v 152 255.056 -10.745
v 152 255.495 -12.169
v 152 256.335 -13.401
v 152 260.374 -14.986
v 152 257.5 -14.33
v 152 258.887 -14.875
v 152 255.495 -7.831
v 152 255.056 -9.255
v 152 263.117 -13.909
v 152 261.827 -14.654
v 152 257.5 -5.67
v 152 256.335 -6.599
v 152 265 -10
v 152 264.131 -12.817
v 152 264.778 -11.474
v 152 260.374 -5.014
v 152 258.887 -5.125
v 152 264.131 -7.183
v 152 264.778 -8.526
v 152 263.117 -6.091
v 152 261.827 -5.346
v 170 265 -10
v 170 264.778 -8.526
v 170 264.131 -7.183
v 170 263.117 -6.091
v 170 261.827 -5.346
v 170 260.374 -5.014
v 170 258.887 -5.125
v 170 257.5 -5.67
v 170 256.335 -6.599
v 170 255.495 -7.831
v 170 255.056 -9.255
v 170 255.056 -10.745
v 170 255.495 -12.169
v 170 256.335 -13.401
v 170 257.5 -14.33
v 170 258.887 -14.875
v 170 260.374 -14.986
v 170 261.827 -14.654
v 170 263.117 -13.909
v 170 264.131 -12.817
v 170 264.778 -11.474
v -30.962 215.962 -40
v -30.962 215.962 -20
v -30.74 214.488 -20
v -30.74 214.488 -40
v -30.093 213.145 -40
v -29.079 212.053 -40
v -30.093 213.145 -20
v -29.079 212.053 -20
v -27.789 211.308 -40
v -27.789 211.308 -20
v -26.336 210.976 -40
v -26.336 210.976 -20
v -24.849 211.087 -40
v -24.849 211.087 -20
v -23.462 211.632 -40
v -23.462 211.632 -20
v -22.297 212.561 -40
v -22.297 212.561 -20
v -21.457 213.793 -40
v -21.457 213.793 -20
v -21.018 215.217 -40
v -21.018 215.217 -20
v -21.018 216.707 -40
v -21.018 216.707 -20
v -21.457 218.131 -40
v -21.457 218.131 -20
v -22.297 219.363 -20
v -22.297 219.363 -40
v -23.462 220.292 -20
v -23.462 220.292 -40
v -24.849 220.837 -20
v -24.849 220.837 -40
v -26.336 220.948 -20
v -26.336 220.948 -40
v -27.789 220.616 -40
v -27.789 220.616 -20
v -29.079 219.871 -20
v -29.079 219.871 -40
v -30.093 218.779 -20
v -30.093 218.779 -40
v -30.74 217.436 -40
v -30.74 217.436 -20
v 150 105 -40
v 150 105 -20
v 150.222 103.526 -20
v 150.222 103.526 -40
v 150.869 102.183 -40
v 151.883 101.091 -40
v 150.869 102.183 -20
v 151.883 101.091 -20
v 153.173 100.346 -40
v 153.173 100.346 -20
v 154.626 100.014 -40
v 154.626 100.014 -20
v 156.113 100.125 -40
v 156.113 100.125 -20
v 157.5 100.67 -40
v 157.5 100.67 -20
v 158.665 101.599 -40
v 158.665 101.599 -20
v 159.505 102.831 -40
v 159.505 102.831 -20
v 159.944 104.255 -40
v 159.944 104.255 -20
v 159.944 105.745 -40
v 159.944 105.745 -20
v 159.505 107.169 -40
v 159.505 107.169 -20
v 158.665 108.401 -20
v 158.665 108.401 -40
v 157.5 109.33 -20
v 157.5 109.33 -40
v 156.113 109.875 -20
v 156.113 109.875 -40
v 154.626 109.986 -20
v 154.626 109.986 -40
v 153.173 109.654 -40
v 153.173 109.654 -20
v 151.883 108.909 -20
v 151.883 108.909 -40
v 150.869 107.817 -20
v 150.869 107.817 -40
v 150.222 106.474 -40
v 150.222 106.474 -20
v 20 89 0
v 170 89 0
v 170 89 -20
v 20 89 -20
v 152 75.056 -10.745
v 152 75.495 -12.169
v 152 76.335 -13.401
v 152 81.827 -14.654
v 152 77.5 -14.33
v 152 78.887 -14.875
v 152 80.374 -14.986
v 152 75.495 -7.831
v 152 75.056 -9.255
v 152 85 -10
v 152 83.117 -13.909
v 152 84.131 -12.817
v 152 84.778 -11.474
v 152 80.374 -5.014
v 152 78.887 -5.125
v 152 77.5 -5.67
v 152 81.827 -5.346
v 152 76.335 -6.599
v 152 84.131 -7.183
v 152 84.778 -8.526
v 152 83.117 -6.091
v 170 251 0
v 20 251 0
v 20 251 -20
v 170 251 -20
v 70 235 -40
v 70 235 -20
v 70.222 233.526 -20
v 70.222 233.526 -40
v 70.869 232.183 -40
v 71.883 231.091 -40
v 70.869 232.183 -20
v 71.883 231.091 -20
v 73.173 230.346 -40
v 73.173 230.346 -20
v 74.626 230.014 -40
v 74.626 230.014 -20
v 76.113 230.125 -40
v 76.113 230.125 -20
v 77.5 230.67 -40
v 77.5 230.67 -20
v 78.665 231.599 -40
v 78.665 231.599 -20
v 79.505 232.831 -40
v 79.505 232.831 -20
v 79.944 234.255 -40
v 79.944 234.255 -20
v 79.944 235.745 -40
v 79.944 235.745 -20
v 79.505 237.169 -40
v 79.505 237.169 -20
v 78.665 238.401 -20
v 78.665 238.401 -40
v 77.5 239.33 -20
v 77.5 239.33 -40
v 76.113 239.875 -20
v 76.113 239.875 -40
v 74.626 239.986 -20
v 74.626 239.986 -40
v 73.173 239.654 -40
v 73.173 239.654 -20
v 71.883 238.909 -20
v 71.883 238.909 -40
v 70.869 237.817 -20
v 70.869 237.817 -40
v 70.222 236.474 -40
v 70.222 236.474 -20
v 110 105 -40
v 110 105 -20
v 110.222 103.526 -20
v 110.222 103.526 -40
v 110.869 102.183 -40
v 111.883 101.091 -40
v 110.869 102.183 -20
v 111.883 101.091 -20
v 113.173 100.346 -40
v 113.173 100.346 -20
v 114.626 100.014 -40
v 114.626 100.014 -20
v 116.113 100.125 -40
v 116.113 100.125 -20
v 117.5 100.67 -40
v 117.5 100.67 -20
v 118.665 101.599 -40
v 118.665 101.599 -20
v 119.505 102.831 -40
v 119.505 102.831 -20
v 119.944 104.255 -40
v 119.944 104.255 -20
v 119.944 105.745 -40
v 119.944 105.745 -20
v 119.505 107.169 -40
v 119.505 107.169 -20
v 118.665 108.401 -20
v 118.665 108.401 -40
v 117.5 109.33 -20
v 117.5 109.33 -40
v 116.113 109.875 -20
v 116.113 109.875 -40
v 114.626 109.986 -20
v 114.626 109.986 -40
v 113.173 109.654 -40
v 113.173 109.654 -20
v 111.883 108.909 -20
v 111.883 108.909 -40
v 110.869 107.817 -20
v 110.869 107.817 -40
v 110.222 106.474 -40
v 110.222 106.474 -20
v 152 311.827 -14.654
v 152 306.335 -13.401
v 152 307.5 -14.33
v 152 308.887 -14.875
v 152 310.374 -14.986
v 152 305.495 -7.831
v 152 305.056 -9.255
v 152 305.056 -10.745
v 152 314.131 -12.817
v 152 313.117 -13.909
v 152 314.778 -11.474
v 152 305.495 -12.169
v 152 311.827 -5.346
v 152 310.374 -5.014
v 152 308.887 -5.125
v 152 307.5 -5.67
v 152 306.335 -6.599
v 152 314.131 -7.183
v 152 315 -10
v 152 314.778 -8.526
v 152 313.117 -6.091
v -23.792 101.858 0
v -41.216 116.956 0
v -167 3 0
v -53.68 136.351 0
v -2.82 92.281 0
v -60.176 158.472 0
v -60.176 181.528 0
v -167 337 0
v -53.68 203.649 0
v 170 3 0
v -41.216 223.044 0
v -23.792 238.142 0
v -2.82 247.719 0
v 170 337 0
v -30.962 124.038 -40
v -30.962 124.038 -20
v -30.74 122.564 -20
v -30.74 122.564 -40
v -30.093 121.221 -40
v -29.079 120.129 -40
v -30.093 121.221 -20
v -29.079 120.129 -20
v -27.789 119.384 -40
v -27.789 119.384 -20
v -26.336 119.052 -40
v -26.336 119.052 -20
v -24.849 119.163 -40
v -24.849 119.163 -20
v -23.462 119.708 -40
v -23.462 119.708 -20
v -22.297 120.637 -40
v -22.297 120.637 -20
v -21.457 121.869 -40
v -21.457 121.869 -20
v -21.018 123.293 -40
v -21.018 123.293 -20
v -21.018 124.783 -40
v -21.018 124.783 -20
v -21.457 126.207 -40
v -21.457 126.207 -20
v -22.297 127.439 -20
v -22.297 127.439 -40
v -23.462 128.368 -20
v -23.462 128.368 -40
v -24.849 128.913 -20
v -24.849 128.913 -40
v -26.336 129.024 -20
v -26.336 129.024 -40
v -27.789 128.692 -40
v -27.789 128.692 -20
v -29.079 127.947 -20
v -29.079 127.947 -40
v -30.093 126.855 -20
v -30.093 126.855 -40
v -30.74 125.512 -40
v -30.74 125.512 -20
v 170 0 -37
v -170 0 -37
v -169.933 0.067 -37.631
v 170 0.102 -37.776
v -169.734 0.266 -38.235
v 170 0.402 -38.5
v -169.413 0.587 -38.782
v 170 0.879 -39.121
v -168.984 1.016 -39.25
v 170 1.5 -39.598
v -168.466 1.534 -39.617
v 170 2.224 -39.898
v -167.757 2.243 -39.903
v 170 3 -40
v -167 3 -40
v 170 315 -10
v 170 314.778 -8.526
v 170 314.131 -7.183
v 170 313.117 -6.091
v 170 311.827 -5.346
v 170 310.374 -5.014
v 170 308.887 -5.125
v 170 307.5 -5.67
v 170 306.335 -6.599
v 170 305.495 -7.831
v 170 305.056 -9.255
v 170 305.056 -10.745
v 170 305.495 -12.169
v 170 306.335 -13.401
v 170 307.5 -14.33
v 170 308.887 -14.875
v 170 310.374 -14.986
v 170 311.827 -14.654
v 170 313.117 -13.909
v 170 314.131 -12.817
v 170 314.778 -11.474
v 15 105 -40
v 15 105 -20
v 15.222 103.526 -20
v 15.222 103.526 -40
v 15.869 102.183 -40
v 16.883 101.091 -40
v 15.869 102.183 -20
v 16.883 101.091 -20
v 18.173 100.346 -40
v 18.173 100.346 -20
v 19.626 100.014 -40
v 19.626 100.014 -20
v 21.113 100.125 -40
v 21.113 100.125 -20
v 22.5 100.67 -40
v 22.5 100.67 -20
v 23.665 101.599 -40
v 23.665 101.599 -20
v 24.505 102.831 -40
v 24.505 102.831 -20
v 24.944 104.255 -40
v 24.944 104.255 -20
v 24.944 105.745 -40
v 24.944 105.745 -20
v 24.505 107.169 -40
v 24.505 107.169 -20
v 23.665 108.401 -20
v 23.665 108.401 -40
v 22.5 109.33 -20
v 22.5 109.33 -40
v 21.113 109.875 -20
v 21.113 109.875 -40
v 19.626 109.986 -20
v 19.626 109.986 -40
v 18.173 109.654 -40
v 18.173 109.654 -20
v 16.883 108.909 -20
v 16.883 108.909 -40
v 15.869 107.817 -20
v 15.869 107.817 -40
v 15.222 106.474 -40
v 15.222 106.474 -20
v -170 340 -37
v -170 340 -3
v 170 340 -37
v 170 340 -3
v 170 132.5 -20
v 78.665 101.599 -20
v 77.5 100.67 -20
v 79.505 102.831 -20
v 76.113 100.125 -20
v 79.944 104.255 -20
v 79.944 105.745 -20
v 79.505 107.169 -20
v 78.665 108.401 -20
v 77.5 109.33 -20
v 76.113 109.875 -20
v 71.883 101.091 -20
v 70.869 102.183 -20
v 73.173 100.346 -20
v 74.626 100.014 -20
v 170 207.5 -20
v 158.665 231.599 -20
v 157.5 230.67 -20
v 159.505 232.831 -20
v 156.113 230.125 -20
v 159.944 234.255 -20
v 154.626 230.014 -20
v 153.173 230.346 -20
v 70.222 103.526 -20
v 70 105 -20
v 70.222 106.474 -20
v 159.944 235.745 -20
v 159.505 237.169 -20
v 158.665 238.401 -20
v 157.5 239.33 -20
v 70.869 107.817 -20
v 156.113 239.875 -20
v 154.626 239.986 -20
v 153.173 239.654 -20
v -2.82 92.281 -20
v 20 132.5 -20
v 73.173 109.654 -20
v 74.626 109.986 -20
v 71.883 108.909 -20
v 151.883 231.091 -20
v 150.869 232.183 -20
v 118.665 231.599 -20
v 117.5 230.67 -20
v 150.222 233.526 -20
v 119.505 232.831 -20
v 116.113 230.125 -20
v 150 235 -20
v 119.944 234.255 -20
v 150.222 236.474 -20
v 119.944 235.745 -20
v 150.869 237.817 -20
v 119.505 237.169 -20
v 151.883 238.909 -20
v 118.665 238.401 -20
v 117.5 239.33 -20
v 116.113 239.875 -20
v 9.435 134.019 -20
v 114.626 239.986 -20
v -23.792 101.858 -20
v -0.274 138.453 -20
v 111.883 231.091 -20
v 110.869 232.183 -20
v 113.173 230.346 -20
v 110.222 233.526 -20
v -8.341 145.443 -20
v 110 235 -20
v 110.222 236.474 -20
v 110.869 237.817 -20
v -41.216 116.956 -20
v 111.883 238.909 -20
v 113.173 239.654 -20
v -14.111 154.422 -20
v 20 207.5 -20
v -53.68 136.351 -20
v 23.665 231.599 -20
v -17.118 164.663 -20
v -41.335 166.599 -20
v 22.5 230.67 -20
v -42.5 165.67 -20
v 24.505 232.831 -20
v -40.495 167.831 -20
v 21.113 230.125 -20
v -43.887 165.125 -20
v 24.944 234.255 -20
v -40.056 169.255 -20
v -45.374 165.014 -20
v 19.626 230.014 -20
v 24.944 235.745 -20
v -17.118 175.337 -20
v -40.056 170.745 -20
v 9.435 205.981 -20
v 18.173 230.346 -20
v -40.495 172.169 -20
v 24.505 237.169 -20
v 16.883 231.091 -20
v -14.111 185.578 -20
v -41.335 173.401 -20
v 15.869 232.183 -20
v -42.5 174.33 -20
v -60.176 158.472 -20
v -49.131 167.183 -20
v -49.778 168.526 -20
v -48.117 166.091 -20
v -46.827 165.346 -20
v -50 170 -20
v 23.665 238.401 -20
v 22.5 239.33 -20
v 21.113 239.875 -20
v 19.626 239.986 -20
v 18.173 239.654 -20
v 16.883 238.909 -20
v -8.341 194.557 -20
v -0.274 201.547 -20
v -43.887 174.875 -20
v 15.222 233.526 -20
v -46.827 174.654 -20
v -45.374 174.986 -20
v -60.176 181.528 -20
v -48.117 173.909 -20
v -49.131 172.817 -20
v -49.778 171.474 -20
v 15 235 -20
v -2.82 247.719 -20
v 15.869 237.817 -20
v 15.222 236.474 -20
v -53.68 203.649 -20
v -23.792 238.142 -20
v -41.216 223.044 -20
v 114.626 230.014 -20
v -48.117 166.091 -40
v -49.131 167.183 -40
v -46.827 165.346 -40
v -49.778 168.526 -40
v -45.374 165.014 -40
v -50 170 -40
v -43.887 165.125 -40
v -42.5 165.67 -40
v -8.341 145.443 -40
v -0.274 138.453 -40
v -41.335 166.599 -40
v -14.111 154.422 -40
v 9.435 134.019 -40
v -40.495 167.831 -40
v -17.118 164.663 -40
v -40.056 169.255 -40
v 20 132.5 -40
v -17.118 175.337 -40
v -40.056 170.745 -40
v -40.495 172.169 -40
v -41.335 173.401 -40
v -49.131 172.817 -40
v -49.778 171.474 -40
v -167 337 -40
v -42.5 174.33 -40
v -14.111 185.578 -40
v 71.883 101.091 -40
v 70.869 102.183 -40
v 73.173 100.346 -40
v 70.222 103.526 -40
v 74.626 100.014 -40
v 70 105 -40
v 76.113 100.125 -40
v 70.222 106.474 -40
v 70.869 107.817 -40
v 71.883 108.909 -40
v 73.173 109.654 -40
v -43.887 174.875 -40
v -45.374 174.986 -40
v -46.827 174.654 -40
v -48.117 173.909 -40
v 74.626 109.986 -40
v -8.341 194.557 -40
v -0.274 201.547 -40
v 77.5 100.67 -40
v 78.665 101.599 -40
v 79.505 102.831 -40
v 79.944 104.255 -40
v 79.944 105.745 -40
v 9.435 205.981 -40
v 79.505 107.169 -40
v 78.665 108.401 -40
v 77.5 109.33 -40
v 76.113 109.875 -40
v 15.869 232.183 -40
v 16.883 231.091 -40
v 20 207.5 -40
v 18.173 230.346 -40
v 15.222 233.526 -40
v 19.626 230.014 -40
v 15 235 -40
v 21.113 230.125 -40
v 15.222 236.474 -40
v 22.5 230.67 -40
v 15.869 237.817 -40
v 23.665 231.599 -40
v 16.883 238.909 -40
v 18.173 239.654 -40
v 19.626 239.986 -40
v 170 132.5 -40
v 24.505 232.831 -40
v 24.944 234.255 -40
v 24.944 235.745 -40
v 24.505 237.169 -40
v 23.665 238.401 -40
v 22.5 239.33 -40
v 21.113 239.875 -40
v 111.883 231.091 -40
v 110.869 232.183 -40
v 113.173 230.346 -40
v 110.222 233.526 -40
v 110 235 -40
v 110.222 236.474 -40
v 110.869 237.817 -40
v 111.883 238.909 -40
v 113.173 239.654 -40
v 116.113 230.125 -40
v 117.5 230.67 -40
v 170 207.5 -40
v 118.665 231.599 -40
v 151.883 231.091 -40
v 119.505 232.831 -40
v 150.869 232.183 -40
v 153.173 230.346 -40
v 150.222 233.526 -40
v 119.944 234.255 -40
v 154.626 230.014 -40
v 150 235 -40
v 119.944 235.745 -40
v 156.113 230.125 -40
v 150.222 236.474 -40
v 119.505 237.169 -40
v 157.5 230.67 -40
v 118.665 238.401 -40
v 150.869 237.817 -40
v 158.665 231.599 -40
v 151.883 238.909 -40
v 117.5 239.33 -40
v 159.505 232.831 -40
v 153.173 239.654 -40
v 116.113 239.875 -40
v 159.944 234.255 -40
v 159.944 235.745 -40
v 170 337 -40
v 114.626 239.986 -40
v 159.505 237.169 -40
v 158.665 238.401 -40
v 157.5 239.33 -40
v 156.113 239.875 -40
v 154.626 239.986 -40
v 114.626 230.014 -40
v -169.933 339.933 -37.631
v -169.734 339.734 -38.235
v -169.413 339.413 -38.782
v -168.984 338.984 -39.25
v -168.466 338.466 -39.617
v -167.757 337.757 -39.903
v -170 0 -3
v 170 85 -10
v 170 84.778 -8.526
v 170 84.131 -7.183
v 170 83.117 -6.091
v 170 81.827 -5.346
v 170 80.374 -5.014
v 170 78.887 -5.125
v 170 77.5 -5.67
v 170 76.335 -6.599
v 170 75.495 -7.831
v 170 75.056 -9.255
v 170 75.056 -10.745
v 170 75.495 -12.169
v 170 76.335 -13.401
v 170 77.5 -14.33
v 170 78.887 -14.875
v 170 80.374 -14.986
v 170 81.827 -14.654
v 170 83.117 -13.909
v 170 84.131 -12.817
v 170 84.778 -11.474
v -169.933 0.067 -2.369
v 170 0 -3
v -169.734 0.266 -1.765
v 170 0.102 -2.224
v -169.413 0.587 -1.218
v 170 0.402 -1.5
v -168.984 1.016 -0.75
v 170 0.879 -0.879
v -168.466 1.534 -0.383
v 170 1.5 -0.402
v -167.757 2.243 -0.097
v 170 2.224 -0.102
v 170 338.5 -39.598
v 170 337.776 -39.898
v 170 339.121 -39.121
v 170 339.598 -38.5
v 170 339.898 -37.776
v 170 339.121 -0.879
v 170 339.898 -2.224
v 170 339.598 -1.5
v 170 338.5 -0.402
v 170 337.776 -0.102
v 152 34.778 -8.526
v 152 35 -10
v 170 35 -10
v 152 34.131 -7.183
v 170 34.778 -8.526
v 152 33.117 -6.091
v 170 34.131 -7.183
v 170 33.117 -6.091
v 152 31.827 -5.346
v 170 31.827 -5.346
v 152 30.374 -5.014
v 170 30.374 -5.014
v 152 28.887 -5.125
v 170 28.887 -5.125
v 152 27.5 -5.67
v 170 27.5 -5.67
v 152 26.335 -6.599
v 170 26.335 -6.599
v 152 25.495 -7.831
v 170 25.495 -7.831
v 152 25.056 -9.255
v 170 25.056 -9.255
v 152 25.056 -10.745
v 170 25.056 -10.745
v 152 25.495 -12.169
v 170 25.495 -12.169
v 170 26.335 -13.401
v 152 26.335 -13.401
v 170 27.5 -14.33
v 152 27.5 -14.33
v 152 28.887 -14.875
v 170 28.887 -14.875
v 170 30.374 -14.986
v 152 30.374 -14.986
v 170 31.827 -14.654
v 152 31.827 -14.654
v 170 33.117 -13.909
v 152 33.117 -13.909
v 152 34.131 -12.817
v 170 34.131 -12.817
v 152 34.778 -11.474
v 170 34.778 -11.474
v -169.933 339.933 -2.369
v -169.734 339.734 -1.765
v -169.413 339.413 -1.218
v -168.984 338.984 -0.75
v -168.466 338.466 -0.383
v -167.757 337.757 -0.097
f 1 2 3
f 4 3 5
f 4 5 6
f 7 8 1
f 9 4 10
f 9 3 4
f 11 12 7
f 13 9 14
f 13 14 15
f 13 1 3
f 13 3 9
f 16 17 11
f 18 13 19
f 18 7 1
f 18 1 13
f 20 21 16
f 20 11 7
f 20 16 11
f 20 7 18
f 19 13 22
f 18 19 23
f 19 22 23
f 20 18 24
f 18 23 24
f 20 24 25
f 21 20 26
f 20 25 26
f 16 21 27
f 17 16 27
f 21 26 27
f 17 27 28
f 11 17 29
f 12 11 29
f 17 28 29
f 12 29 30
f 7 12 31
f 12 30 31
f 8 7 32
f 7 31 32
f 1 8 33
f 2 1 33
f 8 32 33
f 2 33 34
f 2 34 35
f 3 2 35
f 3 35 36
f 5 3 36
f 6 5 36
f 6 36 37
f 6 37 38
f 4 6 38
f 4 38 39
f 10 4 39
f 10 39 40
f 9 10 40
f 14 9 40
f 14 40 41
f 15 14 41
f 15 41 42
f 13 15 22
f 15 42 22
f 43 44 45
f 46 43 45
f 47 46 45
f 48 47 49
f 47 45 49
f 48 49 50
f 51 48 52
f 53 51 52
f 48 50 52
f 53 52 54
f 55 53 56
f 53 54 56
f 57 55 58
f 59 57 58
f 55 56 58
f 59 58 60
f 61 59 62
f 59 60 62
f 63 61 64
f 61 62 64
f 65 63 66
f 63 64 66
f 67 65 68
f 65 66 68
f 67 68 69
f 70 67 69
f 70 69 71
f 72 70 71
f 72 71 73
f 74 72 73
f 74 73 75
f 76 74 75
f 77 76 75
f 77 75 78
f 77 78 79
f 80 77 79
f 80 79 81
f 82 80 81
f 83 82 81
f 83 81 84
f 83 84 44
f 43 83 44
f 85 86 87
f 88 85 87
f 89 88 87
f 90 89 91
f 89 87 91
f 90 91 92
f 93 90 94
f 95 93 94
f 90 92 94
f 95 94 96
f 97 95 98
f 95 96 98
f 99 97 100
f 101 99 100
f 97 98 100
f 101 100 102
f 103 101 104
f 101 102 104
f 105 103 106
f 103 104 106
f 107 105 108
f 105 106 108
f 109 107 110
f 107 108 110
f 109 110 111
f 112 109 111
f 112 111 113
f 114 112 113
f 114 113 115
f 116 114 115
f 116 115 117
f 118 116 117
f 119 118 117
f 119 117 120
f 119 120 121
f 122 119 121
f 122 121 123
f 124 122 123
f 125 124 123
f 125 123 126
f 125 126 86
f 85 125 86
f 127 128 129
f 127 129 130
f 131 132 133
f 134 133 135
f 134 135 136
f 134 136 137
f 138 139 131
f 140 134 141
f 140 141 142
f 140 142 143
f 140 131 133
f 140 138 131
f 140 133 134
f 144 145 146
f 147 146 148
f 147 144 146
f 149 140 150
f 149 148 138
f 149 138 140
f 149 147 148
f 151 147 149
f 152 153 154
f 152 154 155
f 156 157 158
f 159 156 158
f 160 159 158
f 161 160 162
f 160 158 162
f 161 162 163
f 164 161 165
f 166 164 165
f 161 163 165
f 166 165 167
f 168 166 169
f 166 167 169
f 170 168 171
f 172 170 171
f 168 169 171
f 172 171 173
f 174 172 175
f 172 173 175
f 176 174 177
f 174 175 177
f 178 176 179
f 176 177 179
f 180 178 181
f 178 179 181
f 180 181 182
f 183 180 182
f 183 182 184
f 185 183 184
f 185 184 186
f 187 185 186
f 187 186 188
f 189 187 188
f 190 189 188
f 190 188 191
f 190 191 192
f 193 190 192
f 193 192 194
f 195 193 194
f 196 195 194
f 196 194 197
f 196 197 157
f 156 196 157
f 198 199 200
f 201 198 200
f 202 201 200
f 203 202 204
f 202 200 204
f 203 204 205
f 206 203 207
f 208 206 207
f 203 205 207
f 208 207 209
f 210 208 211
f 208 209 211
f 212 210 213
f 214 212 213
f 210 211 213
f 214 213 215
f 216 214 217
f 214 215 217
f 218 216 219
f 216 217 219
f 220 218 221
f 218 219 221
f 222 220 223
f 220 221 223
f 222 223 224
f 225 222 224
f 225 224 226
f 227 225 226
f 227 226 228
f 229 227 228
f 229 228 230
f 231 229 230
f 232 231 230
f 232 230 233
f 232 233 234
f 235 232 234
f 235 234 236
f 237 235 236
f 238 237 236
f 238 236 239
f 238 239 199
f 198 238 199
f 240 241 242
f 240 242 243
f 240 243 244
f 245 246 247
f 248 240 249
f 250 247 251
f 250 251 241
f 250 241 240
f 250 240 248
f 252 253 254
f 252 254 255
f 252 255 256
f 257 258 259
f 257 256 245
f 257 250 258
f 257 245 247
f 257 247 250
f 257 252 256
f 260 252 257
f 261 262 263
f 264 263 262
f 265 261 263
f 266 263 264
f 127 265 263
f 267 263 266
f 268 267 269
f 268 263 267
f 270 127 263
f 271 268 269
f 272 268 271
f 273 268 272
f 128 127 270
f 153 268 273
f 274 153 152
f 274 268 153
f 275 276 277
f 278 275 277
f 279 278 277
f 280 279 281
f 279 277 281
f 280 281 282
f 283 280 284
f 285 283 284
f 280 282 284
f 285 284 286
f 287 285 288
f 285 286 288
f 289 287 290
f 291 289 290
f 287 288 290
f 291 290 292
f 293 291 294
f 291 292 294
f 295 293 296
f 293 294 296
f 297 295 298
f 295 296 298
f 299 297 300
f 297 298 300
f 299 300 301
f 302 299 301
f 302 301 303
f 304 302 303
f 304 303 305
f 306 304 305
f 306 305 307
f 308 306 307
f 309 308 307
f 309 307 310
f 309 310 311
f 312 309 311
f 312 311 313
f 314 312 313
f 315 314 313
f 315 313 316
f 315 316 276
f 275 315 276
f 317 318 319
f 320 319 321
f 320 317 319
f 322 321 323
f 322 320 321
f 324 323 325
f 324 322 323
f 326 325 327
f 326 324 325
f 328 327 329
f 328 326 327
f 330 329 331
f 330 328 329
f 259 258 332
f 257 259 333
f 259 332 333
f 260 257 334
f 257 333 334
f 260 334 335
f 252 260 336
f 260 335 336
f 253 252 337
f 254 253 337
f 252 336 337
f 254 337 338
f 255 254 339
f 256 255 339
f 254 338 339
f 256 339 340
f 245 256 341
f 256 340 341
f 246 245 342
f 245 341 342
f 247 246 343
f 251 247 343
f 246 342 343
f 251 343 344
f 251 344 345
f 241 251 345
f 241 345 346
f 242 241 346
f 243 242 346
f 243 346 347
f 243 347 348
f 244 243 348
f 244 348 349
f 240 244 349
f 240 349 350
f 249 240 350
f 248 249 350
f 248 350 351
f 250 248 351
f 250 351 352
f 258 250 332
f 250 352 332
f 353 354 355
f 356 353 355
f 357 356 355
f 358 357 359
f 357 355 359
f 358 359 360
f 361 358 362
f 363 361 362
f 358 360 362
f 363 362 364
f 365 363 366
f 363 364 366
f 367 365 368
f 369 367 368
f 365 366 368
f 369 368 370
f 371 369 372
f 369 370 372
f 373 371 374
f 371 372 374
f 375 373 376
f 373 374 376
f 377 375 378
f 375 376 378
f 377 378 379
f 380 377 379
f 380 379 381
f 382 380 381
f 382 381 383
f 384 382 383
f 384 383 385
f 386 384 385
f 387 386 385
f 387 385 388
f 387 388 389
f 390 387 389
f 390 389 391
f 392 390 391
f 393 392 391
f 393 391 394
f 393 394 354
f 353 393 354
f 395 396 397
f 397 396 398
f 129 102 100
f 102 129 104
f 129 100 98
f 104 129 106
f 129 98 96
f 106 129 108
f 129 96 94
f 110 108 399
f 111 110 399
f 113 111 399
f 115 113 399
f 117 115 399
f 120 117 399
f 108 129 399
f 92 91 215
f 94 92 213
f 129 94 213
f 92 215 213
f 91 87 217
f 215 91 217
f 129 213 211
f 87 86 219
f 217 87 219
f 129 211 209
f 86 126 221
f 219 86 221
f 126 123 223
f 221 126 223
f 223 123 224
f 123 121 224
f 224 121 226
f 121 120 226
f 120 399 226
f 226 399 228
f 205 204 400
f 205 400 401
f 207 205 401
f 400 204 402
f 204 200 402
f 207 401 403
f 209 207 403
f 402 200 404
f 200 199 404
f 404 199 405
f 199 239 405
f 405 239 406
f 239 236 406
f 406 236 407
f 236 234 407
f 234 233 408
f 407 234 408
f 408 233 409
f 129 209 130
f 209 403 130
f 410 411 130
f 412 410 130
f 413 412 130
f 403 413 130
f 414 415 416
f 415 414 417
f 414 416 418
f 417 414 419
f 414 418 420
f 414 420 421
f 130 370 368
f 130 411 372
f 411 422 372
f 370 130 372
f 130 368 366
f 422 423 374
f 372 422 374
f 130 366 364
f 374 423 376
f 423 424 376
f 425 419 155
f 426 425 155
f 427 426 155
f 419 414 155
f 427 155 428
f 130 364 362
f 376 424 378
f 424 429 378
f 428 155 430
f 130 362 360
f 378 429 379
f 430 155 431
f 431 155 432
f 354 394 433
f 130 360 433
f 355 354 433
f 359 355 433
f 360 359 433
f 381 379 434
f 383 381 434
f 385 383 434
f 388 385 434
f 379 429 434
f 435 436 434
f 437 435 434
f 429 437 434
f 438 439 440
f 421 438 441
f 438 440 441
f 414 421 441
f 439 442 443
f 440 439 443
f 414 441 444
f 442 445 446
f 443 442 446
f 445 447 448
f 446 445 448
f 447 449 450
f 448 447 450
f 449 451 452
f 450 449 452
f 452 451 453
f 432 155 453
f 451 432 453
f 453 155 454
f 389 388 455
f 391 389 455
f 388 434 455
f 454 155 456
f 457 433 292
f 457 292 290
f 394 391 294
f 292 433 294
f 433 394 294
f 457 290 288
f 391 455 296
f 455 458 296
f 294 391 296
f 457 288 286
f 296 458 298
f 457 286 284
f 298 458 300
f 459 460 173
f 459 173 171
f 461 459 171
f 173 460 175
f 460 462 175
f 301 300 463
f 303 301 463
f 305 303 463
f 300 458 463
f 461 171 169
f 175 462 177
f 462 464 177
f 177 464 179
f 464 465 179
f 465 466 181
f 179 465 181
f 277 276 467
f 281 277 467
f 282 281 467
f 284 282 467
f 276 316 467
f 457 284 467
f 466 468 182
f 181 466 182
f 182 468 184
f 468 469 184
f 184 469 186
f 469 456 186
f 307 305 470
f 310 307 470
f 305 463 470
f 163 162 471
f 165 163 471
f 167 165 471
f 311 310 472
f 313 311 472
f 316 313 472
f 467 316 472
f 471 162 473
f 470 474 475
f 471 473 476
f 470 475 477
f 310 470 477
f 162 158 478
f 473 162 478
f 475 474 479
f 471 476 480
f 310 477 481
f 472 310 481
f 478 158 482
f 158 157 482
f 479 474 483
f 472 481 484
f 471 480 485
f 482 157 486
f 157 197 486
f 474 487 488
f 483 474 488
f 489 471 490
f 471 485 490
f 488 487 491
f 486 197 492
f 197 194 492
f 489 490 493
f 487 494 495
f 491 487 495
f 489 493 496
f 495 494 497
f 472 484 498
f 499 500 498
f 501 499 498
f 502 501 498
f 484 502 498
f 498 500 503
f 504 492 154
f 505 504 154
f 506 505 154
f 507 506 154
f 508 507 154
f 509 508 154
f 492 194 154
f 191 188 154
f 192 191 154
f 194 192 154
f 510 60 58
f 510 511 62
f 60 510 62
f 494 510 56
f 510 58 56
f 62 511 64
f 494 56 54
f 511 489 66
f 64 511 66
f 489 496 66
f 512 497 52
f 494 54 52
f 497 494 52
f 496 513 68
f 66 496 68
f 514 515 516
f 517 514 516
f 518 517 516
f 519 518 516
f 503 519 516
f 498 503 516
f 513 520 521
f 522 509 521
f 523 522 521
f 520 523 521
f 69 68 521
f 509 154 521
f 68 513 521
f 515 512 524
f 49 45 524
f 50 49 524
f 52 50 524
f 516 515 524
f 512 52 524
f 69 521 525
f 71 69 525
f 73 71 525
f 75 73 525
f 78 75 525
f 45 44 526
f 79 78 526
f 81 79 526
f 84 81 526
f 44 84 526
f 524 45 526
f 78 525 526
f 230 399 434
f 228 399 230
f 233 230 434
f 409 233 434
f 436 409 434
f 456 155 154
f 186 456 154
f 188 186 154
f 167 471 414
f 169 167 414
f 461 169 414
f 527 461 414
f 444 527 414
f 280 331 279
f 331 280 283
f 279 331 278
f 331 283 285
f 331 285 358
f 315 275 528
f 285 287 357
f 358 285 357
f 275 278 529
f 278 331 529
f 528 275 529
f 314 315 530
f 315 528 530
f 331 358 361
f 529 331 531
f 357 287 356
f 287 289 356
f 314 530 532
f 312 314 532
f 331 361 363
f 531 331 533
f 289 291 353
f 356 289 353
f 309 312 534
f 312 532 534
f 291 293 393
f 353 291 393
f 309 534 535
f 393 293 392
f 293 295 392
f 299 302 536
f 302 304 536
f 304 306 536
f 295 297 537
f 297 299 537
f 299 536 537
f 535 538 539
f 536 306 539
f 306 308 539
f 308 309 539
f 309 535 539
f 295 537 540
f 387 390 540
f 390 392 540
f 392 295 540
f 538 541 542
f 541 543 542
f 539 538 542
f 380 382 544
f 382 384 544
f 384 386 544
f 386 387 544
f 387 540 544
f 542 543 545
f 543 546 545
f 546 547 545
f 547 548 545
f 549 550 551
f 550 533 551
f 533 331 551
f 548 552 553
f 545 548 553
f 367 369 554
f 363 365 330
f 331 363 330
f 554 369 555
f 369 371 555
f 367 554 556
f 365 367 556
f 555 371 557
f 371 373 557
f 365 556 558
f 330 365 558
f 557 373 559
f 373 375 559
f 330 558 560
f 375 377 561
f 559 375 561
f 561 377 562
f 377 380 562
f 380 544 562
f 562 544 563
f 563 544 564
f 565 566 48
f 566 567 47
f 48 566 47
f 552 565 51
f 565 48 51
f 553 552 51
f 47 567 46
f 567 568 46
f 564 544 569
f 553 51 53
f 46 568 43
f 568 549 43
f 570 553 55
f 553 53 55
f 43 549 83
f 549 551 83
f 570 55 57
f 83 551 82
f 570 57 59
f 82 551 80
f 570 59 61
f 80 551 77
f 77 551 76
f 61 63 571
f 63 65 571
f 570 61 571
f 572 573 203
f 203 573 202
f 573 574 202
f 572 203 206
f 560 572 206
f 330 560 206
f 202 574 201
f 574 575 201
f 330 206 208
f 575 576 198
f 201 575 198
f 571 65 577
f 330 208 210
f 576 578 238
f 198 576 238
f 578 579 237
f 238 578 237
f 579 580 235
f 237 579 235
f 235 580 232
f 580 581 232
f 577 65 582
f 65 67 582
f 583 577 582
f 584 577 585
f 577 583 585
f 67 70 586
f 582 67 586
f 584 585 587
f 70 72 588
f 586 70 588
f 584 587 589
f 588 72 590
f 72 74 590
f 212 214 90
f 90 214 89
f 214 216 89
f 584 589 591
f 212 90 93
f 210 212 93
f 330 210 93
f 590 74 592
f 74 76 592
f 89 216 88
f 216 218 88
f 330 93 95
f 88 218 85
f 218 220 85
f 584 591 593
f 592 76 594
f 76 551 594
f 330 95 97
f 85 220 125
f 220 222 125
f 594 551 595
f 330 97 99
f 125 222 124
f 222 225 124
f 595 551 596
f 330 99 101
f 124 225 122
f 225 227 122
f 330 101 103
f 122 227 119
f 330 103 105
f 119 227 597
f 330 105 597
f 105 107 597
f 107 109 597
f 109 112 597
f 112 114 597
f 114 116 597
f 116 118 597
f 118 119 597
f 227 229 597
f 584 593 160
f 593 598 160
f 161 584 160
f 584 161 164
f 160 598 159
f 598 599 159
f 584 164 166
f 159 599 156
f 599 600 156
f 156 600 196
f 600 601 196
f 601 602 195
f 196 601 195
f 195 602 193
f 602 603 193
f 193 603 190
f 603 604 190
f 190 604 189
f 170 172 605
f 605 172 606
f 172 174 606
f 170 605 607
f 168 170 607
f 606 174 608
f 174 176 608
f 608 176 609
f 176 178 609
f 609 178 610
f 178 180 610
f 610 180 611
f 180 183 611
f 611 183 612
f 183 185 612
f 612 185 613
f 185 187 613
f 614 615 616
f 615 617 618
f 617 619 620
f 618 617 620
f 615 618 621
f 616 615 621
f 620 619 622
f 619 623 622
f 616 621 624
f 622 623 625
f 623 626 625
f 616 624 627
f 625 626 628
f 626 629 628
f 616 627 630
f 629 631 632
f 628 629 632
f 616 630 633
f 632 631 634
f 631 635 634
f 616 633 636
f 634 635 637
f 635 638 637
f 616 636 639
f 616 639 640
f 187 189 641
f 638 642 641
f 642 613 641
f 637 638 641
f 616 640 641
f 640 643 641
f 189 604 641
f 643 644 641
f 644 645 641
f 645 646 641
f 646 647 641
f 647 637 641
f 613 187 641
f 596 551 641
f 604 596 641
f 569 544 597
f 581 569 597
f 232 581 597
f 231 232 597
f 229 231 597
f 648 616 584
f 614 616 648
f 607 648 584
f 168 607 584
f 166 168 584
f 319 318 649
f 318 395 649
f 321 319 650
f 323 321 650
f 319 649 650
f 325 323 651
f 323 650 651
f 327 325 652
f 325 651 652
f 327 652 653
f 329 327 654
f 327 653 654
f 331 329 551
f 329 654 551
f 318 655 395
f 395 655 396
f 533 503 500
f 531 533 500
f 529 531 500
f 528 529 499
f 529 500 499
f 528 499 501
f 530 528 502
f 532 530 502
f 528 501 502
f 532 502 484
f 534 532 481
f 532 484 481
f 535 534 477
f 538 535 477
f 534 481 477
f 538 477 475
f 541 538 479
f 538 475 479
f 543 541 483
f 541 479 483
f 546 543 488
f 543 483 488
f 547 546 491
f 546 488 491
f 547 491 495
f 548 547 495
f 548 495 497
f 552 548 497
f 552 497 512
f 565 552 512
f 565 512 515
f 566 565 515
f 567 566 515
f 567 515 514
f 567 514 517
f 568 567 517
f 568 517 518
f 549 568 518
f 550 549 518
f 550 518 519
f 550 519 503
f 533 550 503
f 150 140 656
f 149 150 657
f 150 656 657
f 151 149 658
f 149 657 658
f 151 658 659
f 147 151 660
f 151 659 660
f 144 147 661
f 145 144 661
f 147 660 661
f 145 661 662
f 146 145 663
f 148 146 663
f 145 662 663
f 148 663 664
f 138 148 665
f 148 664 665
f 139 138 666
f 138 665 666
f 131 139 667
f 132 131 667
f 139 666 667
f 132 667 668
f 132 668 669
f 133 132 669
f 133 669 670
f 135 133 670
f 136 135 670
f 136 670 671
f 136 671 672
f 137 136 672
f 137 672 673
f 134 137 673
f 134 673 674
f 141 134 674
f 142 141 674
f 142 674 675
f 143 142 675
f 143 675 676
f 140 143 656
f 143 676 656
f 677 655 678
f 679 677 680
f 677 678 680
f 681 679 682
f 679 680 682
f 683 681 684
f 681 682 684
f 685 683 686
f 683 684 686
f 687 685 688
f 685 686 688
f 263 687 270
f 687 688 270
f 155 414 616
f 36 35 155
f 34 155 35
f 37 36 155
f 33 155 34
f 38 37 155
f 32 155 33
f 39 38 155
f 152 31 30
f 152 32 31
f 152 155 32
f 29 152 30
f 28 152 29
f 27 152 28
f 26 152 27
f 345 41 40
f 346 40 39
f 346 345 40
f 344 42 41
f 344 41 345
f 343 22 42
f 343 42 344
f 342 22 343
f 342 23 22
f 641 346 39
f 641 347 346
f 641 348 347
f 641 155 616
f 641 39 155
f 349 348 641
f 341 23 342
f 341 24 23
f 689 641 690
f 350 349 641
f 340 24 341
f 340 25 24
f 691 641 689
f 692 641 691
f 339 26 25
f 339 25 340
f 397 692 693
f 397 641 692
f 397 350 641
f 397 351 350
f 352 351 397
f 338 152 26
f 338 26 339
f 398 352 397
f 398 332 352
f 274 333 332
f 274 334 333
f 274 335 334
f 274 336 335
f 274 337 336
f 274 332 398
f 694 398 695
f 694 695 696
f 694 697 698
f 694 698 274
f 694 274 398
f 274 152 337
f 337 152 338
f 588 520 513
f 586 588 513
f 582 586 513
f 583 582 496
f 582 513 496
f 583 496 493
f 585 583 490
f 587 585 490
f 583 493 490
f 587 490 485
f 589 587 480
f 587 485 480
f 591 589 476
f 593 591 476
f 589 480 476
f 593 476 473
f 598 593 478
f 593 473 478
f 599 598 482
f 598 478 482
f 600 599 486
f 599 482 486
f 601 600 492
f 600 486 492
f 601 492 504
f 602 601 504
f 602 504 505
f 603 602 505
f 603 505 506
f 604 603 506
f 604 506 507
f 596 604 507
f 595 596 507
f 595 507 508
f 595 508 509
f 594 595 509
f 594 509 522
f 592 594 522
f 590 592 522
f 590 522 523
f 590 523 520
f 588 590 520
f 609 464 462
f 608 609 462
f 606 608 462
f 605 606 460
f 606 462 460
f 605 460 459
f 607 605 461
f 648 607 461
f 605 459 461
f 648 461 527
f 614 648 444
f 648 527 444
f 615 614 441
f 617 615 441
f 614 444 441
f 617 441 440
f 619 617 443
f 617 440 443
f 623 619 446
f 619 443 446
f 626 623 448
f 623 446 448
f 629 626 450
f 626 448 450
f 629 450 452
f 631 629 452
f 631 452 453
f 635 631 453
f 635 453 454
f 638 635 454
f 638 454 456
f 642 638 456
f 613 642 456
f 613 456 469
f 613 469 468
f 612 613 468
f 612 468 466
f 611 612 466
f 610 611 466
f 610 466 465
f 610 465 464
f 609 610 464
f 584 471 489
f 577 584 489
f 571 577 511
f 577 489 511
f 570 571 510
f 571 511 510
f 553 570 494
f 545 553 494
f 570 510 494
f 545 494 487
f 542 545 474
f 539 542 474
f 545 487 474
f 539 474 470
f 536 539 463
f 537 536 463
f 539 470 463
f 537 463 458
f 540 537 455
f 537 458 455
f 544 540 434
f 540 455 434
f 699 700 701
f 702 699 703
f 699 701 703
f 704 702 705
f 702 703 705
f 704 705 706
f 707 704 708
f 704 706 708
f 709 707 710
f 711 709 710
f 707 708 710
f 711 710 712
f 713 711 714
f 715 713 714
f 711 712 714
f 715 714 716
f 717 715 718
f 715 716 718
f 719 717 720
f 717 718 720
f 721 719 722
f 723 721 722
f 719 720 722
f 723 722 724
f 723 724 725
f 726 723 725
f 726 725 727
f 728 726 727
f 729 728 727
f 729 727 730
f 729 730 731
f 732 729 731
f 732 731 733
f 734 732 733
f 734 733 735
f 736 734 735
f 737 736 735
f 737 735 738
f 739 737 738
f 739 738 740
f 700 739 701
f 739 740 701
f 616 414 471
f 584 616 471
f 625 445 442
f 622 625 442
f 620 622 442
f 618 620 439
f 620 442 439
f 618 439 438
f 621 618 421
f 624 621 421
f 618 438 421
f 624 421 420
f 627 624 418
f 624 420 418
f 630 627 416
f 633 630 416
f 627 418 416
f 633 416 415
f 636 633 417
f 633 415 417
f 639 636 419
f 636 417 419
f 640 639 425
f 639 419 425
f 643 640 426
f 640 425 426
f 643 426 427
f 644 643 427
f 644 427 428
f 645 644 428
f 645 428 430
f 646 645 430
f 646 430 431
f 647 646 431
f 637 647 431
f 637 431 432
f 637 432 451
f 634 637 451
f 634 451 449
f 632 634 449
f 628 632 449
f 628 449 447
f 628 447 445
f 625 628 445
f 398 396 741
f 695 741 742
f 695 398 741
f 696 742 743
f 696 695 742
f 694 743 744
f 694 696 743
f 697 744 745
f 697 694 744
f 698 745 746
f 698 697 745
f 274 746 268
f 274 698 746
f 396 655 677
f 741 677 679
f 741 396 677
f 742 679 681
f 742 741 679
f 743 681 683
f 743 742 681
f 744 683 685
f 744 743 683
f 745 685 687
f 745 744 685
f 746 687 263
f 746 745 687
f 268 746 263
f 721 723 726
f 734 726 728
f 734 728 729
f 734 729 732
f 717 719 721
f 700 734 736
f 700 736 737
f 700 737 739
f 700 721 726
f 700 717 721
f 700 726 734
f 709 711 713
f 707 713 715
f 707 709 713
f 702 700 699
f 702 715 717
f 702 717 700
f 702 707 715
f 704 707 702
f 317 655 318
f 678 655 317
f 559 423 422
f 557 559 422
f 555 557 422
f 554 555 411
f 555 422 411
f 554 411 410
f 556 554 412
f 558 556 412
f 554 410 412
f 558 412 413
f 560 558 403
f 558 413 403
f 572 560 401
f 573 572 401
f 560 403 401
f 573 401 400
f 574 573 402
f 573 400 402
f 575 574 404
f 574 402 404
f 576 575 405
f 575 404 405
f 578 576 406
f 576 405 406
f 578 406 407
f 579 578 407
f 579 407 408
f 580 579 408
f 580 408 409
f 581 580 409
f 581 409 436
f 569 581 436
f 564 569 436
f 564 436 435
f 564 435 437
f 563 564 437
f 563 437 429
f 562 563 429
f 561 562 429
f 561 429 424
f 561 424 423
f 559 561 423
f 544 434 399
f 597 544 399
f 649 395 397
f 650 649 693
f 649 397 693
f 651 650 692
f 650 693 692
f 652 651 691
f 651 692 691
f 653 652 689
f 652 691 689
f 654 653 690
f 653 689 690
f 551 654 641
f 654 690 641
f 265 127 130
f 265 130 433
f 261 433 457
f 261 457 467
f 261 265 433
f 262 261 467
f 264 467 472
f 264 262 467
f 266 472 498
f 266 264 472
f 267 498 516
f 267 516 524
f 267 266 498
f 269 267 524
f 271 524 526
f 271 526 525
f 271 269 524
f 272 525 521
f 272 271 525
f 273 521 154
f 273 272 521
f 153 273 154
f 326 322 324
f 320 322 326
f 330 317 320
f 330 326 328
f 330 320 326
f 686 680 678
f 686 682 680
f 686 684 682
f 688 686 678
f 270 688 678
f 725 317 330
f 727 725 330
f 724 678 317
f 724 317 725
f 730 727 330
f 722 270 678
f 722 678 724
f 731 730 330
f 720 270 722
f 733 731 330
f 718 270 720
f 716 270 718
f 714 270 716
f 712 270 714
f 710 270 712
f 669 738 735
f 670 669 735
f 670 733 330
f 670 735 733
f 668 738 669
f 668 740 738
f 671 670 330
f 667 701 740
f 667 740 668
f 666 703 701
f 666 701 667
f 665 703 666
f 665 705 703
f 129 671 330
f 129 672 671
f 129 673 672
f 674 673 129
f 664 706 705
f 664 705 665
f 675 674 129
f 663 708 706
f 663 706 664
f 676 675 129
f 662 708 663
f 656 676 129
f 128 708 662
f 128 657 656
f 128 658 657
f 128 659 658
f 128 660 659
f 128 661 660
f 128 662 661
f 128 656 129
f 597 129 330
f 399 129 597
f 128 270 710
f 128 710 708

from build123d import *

# Parameters (mm, degrees)
SKETCH2_W               = 340
SKETCH2_H               = 340
BOSS_EXTRUDE1_DEPTH     = 40
CUT_EXTRUDE1_DEPTH      = 20
CUT_EXTRUDE2_DEPTH      = 100
CUT_EXTRUDE2_DEPTH_BACK = 199
SKETCH5_R               = 5
CUT_EXTRUDE4_DEPTH      = 363
CUT_EXTRUDE4_DEPTH_BACK = 260
SKETCH6_R               = 5
CUT_EXTRUDE5_DEPTH      = 18
FILLET1_R               = 3


with BuildPart() as part:
    # Sketch2 → Boss-Extrude1 (new body)
    with BuildSketch(Plane.XY):
        with Locations((0, 170)):
            Rectangle(SKETCH2_W, SKETCH2_H)
    extrude(amount=-BOSS_EXTRUDE1_DEPTH)

    # Sketch3 → Cut-Extrude1 (cut)
    with BuildSketch(Plane.XY):
        with BuildLine():
            ThreePointArc((20, 207.5), (-17.5, 170), (20, 132.5))
            Line((20, 132.5), (170, 132.5))
            Line((170, 132.5), (170, 89))
            Line((170, 89), (20, 89))
            ThreePointArc((20, 89), (-61, 170), (20, 251))
            Line((20, 251), (170, 251))
            Line((170, 251), (170, 207.5))
            Line((170, 207.5), (20, 207.5))
        make_face()
    extrude(amount=-CUT_EXTRUDE1_DEPTH, mode=Mode.SUBTRACT)

    # Sketch4 → Cut-Extrude2 (cut, two sides)
    with BuildSketch(Plane.XY) as cut_extrude2_sk:
        with BuildLine():
            Line((170, 132.5), (170, 207.5))
            Line((170, 207.5), (20, 207.5))
            ThreePointArc((20, 207.5), (-17.5, 170), (20, 132.5))
            Line((20, 132.5), (170, 132.5))
        make_face()
    extrude(amount=CUT_EXTRUDE2_DEPTH, mode=Mode.SUBTRACT)
    extrude(cut_extrude2_sk.sketch, amount=-CUT_EXTRUDE2_DEPTH_BACK, mode=Mode.SUBTRACT)

    # Sketch5 → Cut-Extrude4 (cut, two sides)
    with BuildSketch(Plane.XY) as cut_extrude4_sk:
        with Locations(Location((20, 235, 0), (0, 0, 180))):
            Circle(SKETCH5_R)
        with Locations(Location((20, 105, 0), (0, 0, 180))):
            Circle(SKETCH5_R)
        with Locations(Location((75, 235, 0), (0, 0, 180))):
            Circle(SKETCH5_R)
        with Locations(Location((75, 105, 0), (0, 0, 180))):
            Circle(SKETCH5_R)
        with Locations(Location((115, 235, 0), (0, 0, 180))):
            Circle(SKETCH5_R)
        with Locations(Location((155, 235, 0), (0, 0, 180))):
            Circle(SKETCH5_R)
        with Locations(Location((115, 105, 0), (0, 0, 180))):
            Circle(SKETCH5_R)
        with Locations(Location((155, 105, 0), (0, 0, 180))):
            Circle(SKETCH5_R)
        with Locations(Location((-25.961940777, 215.961940777, 0), (0, 0, 180))):
            Circle(SKETCH5_R)
        with Locations(Location((-45, 170, 0), (0, 0, 180))):
            Circle(SKETCH5_R)
        with Locations(Location((-25.961940777, 124.038059223, 0), (0, 0, 180))):
            Circle(SKETCH5_R)
    extrude(amount=CUT_EXTRUDE4_DEPTH, mode=Mode.SUBTRACT)
    extrude(cut_extrude4_sk.sketch, amount=-CUT_EXTRUDE4_DEPTH_BACK, mode=Mode.SUBTRACT)

    # Sketch6 → Cut-Extrude5 (cut)
    with BuildSketch(Plane(origin=(170, 0, 0), x_dir=(0, 0, -1), z_dir=(1, 0, 0))):
        with Locations(Location((10, 80, 0), (0, 0, 90))):
            Circle(SKETCH6_R)
        with Locations(Location((10, 310, 0), (0, 0, 90))):
            Circle(SKETCH6_R)
        with Locations(Location((10, 260, 0), (0, 0, 90))):
            Circle(SKETCH6_R)
        with Locations(Location((10, 30, 0), (0, 0, 90))):
            Circle(SKETCH6_R)
    extrude(amount=-CUT_EXTRUDE5_DEPTH, mode=Mode.SUBTRACT)

    # Fillet1
    fillet1_edges = [part.edges().sort_by_distance(p)[0] for p in [
        (0, 340, -40),
        (-170, 170, -40),
        (0, 340, 0),
        (0, 0, 0),
        (-170, 170, 0),
        (0, 0, -40),
    ]]
    fillet(fillet1_edges, radius=FILLET1_R)


solid = part.part
